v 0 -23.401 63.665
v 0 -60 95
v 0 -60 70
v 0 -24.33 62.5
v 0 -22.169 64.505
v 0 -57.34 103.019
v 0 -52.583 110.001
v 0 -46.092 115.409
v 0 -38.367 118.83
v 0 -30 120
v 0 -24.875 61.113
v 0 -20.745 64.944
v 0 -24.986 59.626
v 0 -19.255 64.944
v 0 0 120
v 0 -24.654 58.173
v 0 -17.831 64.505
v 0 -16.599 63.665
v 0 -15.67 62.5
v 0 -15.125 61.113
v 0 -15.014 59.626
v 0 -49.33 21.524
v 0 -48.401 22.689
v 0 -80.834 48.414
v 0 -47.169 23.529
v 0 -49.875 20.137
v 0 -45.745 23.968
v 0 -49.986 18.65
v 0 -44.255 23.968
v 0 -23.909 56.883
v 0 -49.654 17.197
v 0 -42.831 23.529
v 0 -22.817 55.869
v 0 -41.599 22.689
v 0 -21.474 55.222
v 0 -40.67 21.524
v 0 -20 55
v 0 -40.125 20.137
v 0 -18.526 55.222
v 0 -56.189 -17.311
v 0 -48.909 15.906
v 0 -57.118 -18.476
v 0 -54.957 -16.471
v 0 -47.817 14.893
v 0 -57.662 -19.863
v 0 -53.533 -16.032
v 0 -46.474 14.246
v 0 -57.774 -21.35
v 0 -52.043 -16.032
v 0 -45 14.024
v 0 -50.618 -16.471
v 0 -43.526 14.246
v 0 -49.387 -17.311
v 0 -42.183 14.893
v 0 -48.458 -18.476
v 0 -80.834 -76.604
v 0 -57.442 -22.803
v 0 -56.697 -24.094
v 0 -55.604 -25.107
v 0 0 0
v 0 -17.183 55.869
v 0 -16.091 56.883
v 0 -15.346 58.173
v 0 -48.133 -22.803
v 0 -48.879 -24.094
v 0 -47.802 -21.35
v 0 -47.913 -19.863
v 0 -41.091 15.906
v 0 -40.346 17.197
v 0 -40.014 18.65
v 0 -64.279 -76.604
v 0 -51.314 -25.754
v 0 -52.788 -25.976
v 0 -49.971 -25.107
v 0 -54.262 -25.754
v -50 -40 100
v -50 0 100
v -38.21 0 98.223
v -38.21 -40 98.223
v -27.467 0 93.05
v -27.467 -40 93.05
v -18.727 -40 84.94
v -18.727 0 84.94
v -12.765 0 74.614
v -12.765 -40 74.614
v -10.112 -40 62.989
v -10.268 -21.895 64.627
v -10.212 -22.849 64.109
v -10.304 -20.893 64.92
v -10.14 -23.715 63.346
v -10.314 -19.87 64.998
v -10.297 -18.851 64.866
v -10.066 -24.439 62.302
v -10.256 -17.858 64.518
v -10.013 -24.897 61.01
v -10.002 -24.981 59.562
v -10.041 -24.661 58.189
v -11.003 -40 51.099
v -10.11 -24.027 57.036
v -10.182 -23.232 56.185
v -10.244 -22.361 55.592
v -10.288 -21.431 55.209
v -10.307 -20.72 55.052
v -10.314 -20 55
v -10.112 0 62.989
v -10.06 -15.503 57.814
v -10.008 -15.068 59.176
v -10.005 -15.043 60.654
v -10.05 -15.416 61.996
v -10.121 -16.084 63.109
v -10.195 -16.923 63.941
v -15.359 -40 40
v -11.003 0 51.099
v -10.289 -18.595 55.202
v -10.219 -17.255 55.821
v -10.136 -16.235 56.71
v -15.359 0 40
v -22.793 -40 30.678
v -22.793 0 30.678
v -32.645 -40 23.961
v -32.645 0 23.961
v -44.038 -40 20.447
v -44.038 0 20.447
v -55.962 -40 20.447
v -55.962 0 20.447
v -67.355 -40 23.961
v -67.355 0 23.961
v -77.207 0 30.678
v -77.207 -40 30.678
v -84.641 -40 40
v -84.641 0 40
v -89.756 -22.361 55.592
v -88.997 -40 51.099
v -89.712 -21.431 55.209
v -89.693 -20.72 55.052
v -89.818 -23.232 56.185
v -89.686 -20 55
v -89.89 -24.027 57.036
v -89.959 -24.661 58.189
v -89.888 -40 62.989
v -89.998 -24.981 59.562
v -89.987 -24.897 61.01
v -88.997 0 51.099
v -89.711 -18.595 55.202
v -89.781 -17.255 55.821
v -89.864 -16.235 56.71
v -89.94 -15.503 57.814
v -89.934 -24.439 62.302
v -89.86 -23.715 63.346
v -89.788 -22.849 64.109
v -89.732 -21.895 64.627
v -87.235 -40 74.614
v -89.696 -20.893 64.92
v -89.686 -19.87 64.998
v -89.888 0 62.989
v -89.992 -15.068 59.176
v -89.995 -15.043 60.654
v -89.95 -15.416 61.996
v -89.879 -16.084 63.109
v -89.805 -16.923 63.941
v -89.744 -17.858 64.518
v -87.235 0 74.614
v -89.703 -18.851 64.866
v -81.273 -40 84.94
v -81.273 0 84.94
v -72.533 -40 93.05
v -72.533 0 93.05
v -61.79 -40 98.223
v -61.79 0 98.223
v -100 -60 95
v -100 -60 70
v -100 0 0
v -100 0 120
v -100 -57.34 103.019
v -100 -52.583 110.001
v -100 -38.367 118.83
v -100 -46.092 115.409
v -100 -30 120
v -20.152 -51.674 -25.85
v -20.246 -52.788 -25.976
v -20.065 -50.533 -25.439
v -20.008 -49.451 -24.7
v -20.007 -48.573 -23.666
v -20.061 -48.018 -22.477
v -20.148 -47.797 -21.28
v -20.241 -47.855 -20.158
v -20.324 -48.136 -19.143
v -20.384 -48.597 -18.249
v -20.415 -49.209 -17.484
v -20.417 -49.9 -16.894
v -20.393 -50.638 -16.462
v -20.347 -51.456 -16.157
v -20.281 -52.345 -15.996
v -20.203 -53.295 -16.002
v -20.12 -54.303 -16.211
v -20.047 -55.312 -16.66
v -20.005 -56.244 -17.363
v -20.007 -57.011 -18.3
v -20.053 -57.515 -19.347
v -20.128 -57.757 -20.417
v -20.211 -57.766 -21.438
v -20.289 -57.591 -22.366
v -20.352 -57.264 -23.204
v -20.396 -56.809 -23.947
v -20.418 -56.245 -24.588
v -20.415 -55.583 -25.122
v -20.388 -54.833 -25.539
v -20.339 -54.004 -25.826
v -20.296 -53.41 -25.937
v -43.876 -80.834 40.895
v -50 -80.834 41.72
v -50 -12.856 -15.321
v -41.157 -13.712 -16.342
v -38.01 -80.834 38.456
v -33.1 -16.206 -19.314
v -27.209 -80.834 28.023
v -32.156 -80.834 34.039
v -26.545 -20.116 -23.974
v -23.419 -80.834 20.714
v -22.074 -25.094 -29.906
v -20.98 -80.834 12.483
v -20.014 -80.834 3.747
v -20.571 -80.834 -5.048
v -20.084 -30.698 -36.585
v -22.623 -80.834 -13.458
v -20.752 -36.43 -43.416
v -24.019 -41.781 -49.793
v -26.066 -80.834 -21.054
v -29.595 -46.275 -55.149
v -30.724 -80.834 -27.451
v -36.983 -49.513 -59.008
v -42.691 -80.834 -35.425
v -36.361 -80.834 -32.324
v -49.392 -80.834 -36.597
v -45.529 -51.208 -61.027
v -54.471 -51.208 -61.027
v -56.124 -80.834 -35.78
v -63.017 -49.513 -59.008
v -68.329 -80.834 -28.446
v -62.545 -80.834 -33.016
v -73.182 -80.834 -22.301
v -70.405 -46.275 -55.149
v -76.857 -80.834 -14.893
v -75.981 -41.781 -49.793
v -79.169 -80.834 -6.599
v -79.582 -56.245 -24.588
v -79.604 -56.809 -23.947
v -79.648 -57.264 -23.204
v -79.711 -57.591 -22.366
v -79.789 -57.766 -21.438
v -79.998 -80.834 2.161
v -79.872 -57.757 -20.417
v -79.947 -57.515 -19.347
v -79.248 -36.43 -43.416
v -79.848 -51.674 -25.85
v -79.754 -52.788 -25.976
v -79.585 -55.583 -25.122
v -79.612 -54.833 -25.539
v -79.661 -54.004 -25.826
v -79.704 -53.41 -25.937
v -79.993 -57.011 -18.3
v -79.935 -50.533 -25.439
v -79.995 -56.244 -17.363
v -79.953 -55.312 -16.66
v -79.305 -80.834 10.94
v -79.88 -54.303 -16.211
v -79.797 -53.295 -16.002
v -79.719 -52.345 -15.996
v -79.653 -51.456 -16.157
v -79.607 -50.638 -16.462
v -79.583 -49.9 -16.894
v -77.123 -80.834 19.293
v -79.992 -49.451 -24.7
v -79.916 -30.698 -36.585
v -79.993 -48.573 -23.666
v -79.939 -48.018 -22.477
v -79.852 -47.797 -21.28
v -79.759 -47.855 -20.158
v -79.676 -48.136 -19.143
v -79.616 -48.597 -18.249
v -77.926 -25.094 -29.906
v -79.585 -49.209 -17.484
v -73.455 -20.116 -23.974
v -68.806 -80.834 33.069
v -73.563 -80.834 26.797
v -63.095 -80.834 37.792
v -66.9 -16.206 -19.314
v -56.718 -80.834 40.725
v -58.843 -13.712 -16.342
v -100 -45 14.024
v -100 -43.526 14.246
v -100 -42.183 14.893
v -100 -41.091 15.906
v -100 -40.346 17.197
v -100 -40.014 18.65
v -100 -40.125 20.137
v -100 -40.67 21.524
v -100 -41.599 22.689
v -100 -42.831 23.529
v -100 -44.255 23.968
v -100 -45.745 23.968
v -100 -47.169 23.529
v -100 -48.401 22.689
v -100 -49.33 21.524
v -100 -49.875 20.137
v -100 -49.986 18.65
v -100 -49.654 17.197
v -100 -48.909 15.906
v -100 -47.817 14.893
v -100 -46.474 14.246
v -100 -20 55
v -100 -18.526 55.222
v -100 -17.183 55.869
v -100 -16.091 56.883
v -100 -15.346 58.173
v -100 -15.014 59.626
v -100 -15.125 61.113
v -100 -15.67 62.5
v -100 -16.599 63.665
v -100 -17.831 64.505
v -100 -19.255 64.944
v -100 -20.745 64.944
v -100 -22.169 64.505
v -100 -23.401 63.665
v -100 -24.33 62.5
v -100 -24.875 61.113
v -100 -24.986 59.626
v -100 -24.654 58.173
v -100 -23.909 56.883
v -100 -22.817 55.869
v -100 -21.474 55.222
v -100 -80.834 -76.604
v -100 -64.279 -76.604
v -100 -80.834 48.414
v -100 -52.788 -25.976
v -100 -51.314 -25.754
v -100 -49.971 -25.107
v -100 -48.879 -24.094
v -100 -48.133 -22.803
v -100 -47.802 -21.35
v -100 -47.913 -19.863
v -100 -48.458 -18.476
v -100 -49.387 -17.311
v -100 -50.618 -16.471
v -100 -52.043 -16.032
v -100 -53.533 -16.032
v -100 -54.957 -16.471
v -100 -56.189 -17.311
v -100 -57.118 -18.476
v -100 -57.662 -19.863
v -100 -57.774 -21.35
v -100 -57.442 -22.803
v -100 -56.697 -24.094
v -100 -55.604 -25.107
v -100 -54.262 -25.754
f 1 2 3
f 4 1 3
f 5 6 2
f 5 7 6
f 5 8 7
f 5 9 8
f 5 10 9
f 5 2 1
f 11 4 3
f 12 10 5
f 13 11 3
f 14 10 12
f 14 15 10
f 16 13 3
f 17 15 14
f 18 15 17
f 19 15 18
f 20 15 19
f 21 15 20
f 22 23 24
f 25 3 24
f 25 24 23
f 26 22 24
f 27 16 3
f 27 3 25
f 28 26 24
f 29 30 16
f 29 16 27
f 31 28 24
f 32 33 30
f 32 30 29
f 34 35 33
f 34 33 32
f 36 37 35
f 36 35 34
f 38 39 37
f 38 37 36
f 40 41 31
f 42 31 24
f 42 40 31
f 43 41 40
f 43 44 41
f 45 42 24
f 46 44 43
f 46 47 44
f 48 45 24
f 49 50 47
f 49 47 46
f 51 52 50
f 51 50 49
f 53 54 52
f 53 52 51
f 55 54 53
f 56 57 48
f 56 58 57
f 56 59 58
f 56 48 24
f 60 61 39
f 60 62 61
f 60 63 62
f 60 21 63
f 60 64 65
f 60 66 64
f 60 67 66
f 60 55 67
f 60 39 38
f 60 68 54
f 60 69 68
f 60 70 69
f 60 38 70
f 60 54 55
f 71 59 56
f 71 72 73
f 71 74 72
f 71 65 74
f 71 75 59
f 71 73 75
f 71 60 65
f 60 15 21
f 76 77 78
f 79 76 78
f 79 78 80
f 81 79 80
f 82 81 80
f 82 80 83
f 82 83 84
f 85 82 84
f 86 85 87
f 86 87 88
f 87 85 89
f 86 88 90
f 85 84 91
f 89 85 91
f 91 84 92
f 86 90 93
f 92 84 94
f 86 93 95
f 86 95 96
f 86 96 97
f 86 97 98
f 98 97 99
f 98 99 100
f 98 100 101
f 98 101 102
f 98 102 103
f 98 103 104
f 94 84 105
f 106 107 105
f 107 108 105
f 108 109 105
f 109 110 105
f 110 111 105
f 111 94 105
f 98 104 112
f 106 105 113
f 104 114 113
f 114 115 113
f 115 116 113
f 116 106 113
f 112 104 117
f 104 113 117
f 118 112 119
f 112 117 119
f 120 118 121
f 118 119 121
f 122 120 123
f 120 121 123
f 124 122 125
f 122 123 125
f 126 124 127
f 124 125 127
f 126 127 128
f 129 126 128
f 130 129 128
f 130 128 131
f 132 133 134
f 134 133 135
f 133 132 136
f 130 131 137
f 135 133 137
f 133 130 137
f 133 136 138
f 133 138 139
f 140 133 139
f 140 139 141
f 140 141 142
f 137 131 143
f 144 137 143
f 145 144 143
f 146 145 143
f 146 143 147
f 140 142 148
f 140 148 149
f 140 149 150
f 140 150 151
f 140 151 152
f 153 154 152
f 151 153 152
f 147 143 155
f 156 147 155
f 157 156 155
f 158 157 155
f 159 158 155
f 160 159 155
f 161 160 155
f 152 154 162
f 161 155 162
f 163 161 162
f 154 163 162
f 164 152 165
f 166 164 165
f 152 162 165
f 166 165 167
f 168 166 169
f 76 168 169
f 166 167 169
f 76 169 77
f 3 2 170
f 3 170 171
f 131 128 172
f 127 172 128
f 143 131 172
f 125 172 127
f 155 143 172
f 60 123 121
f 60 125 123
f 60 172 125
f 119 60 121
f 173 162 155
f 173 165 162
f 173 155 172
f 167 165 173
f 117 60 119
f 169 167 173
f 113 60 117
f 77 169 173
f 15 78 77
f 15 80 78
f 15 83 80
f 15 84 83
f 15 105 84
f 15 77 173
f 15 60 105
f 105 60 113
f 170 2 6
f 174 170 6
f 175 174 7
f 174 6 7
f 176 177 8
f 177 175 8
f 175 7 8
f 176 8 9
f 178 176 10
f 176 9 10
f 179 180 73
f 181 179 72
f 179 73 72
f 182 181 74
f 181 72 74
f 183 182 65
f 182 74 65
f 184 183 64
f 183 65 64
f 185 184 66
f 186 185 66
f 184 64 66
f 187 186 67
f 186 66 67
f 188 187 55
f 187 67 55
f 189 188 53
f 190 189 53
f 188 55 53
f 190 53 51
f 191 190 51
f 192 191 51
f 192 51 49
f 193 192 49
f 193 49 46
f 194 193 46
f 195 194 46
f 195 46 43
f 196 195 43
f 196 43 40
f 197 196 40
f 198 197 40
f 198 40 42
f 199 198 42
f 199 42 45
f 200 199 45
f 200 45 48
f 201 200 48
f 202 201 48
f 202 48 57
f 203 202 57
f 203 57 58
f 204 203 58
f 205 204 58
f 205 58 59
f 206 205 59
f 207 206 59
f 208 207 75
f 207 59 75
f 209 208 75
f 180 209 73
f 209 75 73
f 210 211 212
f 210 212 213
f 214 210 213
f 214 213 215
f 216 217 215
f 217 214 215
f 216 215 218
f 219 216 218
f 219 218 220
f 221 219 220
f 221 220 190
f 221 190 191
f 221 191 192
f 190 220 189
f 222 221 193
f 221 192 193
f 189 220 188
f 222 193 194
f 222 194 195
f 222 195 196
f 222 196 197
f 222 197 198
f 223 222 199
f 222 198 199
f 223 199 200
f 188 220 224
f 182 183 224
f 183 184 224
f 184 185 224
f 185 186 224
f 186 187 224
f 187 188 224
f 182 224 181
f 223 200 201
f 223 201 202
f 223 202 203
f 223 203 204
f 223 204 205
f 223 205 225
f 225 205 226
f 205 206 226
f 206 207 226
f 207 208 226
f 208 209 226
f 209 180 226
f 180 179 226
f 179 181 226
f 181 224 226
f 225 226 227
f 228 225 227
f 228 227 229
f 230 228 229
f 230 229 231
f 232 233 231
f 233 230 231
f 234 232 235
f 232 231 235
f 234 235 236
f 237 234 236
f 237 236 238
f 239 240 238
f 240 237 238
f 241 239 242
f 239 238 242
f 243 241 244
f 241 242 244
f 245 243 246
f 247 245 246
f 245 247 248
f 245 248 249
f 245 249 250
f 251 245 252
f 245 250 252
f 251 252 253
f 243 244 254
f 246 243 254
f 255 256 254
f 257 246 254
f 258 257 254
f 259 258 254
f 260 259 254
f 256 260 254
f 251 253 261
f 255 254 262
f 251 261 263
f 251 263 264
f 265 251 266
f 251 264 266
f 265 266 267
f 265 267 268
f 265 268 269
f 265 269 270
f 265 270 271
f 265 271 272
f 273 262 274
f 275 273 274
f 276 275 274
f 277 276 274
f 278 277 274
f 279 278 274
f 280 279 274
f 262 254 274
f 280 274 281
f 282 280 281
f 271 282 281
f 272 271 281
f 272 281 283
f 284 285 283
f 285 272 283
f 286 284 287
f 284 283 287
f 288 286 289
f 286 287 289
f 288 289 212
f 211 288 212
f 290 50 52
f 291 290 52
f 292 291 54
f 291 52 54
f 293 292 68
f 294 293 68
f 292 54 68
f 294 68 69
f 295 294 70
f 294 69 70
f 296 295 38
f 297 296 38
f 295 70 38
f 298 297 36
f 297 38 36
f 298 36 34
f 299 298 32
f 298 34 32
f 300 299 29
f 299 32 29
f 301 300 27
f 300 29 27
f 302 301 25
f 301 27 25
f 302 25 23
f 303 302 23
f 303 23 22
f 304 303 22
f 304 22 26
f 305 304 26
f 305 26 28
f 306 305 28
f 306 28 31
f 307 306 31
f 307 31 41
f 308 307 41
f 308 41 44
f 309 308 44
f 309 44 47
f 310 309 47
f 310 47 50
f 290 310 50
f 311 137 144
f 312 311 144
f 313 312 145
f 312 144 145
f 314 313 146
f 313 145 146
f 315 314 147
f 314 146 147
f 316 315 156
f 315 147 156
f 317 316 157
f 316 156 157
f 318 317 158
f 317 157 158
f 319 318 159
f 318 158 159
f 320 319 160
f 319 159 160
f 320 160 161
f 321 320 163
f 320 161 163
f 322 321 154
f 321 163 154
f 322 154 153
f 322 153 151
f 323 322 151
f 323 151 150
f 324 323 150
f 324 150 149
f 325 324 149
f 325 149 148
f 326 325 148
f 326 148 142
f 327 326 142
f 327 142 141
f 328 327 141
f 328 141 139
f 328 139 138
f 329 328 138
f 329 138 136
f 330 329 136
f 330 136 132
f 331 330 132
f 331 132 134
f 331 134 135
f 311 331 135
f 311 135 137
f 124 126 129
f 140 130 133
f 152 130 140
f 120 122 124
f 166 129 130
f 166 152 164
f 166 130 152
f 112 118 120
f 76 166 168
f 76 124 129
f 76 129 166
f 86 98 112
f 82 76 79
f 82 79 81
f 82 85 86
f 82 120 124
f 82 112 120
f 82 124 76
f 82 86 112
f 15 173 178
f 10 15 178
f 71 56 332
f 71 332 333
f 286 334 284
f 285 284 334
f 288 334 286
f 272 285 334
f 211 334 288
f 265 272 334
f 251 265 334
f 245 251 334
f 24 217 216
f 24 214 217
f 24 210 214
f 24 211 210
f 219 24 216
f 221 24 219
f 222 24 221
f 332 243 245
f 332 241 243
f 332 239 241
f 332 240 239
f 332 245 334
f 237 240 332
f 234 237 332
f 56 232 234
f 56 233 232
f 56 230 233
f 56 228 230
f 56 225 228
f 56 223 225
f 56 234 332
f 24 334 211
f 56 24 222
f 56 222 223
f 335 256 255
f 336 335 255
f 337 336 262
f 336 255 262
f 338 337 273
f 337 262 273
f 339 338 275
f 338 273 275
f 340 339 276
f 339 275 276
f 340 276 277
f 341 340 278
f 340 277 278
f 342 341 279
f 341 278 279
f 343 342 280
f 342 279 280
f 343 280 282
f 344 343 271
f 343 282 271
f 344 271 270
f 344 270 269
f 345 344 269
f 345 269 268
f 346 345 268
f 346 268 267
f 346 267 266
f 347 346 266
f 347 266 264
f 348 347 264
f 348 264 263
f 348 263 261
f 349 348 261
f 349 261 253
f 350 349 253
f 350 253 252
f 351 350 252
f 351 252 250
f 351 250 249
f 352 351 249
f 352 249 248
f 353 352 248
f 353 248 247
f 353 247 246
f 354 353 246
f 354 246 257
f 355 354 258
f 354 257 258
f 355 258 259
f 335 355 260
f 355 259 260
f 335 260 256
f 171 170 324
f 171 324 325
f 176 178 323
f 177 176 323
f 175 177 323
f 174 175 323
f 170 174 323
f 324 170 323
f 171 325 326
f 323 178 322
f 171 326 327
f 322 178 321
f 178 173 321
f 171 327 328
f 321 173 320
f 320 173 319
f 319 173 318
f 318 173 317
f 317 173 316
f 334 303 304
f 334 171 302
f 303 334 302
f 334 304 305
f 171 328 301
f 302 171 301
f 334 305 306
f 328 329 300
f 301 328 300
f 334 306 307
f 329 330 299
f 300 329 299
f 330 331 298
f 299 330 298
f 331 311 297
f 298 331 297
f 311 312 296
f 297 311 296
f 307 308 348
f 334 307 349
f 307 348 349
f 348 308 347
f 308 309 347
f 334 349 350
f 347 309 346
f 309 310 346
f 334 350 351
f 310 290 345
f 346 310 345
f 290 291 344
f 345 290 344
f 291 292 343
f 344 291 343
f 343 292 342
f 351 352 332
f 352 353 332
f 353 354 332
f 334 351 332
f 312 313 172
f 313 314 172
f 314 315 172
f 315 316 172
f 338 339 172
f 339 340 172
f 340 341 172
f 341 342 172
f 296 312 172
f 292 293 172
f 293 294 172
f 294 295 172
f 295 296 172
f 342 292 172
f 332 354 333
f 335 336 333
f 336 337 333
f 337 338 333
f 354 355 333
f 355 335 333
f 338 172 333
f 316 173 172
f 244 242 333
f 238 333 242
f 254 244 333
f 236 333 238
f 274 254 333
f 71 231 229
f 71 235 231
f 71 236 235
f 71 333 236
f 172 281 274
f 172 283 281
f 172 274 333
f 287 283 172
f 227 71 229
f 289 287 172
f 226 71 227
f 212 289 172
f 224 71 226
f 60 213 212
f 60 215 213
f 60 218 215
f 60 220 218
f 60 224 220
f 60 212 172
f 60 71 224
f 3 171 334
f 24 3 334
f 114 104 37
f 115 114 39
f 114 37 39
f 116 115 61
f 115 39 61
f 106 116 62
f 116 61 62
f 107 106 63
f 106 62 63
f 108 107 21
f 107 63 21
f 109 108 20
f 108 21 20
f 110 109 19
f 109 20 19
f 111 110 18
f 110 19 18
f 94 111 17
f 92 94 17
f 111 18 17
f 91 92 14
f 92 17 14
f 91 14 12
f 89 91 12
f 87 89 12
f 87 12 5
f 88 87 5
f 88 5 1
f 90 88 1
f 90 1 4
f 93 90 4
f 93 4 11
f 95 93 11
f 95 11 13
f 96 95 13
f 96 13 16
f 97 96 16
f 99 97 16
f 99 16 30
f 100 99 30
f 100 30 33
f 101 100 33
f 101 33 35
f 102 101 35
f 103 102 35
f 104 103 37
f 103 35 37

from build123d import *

# Parameters (mm, degrees)
BOSS_EXTRUDE1_DEPTH = 100
SKETCH3_R           = 40
CUT_EXTRUDE1_DEPTH  = 40
SKETCH4_R           = 30
CUT_EXTRUDE2_DEPTH  = 176.880963539
SKETCH5_R           = 5
CUT_EXTRUDE3_DEPTH  = 176.880963539
SKETCH6_R           = 5
CUT_EXTRUDE4_DEPTH  = 176.880963641
SKETCH7_R           = 5
CUT_EXTRUDE5_DEPTH  = 176.880963641
CUT_EXTRUDE7_DEPTH  = 176.880963641


with BuildPart() as part:
    # Sketch2 → Boss-Extrude1 (new body)
    with BuildSketch(Plane(origin=(0, 0, 0), x_dir=(0, 0, -1), z_dir=(1, 0, 0))):
        Polygon((0, 0), (-120, 0), (-120, -60), (-70, -60), (-48.414121025, -80.833862553), (29.789031359, -80.833862553), (76.604444312, -80.833862553), (76.604444312, -64.278760969), align=None)
    extrude(amount=-BOSS_EXTRUDE1_DEPTH)

    # Sketch3 → Cut-Extrude1 (cut)
    with BuildSketch(Plane(origin=(0, 0, 0), x_dir=(1, 0, 0), z_dir=(0, 1, 0))):
        with Locations(Location((-50, -60, 0), (0, 0, 270))):
            Circle(SKETCH3_R)
    extrude(amount=-CUT_EXTRUDE1_DEPTH, mode=Mode.SUBTRACT)

    # Sketch4 → Cut-Extrude2 (cut, through all)
    with BuildSketch(Plane(origin=(0, 0, 0), x_dir=(1, 0, 0), z_dir=(0, 0.7660444431189771, -0.6427876096865404))):
        with Locations(Location((-50, 50, 0), (0, 0, 270))):
            Circle(SKETCH4_R)
    extrude(amount=-CUT_EXTRUDE2_DEPTH, mode=Mode.SUBTRACT)

    # Sketch5 → Cut-Extrude3 (cut, through all)
    with BuildSketch(Plane(origin=(0, 0, 0), x_dir=(0, 0, -1), z_dir=(1, 0, 0))):
        with Locations((20.976095068, -52.787854687)):
            Circle(SKETCH5_R)
    extrude(amount=-CUT_EXTRUDE3_DEPTH, mode=Mode.SUBTRACT)

    # Sketch6 → Cut-Extrude4 (cut, through all)
    with BuildSketch(Plane(origin=(0, 0, 0), x_dir=(0, 0, -1), z_dir=(1, 0, 0))):
        with Locations((-19.023904932, -45)):
            Circle(SKETCH6_R)
    extrude(amount=-CUT_EXTRUDE4_DEPTH, mode=Mode.SUBTRACT)

    # Sketch7 → Cut-Extrude5 (cut, through all)
    with BuildSketch(Plane(origin=(0, 0, 0), x_dir=(0, 0, -1), z_dir=(1, 0, 0))):
        with Locations((-60, -20)):
            Circle(SKETCH7_R)
    extrude(amount=-CUT_EXTRUDE5_DEPTH, mode=Mode.SUBTRACT)

    # Sketch8 → Cut-Extrude7 (cut, through all)
    with BuildSketch(Plane(origin=(0, 0, 0), x_dir=(0, 0, -1), z_dir=(1, 0, 0))):
        with BuildLine():
            Line((-120, -30), (-120, -60))
            Line((-120, -60), (-95, -60))
            ThreePointArc((-95, -60), (-112.930749028, -49.52562419), (-120, -30))
        make_face()
    extrude(amount=-CUT_EXTRUDE7_DEPTH, mode=Mode.SUBTRACT)


solid = part.part
